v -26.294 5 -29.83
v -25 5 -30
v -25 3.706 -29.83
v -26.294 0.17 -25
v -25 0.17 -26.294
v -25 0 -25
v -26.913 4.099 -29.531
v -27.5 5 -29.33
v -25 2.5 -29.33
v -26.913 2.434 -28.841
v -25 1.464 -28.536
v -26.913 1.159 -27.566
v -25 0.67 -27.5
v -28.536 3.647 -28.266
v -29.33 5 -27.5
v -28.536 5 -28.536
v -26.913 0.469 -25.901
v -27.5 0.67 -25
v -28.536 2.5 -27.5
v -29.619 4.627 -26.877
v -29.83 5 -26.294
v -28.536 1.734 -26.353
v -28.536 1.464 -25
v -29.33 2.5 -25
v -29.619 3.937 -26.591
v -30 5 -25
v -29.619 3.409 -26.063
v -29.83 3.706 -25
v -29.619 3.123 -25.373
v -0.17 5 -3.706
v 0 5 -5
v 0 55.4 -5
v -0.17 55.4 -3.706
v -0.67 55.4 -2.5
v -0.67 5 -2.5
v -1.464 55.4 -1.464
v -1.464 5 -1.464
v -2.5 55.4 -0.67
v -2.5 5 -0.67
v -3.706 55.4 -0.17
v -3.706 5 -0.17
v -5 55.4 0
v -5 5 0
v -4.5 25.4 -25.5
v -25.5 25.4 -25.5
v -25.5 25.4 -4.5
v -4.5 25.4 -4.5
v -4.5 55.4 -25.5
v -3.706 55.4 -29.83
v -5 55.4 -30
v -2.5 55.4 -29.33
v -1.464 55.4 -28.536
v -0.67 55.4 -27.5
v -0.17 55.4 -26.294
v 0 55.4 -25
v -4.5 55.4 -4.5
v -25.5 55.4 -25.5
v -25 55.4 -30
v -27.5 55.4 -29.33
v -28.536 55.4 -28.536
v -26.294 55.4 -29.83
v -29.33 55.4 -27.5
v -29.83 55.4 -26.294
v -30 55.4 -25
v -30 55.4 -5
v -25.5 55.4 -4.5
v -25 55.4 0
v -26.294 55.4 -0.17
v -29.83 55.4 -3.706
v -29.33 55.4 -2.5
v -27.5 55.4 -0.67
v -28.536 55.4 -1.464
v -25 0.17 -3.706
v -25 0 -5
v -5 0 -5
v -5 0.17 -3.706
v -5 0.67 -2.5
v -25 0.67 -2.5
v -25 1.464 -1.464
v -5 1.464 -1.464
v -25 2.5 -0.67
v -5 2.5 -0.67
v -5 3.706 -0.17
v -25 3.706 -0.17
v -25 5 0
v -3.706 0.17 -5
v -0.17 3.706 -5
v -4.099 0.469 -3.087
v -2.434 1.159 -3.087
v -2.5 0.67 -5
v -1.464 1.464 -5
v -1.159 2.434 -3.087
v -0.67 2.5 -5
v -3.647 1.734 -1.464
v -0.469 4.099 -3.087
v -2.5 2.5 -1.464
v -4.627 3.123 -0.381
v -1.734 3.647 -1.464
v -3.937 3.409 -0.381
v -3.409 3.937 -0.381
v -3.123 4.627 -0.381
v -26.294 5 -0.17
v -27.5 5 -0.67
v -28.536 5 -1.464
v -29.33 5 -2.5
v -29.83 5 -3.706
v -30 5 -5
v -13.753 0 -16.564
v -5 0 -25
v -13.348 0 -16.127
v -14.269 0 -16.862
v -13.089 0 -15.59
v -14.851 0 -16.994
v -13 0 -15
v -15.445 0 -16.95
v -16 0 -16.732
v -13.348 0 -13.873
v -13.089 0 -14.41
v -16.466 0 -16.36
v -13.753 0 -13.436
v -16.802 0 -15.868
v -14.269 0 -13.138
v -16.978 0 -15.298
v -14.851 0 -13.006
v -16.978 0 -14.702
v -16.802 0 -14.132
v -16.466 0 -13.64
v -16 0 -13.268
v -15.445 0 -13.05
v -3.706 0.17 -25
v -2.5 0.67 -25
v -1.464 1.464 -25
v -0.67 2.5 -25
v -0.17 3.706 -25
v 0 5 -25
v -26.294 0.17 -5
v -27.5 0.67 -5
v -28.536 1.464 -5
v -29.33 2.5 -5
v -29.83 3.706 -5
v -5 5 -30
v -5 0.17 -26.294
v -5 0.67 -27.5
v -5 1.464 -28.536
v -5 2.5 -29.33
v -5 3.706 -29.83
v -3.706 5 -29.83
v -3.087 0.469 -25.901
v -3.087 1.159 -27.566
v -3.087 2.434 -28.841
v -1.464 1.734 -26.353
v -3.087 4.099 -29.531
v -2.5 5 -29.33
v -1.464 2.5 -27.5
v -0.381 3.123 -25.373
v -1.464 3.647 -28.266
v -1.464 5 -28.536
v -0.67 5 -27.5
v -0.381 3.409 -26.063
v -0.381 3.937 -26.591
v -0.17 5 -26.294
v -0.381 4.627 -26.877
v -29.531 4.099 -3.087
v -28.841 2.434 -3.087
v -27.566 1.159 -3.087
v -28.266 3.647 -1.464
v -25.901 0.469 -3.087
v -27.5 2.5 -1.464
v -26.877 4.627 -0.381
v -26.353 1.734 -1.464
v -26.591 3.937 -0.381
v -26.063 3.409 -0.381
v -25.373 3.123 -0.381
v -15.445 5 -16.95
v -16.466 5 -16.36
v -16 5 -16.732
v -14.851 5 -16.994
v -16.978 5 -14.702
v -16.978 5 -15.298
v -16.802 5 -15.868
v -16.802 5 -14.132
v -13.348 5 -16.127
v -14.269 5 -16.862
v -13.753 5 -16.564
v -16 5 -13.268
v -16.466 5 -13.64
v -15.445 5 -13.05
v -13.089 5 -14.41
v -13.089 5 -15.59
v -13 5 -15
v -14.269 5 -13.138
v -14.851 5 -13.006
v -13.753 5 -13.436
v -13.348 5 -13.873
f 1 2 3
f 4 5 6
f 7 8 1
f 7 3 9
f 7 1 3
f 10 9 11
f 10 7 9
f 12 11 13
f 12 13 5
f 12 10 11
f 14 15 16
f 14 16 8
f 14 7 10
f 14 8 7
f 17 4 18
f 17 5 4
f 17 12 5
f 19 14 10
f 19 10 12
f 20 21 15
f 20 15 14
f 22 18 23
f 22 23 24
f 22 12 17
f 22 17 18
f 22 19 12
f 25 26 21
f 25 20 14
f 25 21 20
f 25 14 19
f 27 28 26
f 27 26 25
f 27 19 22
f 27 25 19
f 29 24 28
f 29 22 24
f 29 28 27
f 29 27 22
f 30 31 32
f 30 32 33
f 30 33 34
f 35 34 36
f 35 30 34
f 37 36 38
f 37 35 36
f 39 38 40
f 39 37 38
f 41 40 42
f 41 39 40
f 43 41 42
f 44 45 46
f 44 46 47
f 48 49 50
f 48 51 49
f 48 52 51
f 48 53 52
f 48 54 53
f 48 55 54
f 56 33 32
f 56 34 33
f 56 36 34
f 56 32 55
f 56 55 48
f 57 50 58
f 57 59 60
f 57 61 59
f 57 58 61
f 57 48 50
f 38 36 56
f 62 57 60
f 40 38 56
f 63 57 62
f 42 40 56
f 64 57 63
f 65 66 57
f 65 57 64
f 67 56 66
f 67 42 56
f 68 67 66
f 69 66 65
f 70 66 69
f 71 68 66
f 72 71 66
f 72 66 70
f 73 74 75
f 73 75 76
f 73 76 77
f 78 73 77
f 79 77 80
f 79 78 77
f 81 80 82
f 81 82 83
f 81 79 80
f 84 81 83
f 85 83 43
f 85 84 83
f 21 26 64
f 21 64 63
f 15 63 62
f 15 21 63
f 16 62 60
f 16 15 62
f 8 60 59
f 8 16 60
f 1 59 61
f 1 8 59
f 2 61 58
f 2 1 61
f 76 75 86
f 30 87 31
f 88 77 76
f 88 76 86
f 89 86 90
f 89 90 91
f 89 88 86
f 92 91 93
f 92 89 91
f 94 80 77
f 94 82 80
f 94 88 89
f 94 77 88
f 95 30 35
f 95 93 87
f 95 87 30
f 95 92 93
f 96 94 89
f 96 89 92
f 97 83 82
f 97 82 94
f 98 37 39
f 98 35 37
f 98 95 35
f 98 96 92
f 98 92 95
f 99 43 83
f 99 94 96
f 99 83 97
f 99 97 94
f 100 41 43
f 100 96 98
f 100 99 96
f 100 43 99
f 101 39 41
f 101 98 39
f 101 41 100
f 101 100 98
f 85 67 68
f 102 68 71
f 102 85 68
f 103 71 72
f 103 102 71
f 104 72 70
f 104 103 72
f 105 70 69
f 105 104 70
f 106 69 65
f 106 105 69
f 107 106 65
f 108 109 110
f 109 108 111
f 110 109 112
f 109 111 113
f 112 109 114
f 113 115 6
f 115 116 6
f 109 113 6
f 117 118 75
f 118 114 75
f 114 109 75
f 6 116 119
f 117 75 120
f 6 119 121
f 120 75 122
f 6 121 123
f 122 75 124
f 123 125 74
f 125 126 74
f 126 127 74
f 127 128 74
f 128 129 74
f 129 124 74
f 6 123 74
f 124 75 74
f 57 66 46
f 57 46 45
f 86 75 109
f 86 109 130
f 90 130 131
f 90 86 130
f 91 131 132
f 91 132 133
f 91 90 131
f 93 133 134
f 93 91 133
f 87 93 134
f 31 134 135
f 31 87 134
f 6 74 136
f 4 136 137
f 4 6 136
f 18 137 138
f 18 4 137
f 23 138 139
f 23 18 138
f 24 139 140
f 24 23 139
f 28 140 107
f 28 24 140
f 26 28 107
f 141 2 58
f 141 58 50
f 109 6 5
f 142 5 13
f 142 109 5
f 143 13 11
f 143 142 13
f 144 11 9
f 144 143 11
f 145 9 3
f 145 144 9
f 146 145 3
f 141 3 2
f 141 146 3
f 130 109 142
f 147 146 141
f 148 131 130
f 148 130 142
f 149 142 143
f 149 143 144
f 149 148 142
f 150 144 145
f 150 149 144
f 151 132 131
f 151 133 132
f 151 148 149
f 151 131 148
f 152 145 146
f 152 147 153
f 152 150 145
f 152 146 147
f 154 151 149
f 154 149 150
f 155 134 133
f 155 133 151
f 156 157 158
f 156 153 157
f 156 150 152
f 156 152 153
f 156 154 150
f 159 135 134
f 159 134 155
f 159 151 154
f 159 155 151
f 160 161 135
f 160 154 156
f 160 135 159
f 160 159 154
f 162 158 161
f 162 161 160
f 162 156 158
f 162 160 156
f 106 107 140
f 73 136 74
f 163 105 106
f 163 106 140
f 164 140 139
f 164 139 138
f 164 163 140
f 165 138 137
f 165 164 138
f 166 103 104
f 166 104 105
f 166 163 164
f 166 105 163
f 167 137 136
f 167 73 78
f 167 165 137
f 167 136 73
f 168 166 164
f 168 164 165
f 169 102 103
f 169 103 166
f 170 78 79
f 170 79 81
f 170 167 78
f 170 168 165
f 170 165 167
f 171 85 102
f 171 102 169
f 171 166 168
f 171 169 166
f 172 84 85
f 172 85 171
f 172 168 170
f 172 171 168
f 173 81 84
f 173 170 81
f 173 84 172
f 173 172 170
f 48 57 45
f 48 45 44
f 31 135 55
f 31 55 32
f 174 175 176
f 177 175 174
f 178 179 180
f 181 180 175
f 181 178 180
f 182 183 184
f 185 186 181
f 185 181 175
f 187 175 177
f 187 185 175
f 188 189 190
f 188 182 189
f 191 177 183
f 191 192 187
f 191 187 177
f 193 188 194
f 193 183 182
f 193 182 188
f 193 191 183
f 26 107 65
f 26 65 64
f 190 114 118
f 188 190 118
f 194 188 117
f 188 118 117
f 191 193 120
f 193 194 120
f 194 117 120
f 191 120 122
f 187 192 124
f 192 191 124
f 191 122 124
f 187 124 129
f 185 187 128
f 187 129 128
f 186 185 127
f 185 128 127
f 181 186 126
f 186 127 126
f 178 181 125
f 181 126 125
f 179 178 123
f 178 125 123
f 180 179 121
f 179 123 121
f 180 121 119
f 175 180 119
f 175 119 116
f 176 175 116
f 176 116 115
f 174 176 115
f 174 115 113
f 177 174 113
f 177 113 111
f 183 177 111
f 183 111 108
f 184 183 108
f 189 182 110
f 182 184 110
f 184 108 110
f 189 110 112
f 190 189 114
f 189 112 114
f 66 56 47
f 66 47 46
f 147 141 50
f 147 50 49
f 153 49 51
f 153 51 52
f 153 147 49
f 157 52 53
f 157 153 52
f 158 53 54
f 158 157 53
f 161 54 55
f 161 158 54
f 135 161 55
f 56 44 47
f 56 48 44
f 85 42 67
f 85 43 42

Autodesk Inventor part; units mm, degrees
ref_plane "YZ Plane" through (0, 0, 0) normal (1, 0, 0) x (0, 1, 0)
ref_plane "XZ Plane" through (0, 0, 0) normal (0, 1, 0) x (-1, 0, 0)
ref_plane "XY Plane" through (0, 0, 0) normal (0, 0, 1) x (1, 0, 0)
sketch "Sketch1" plane through (0, 0, 0) normal (0, 1, 0) x (-1, 0, 0)
  line L0 (0, 0) -> (30, 0)
  line L1 (30, 0) -> (30, -30)
  line L2 (30, -30) -> (0, -30)
  line L3 (0, -30) -> (0, 0)
  dimension "d0" = 30
  dimension "d1" = 30
extrude "Extrusion1" add sketch "Sketch1" along normal blind 55.4
sketch "Sketch2" plane through (0, 55.4, 0) normal (0, 1, 0) x (1, 0, 0)
  line L0 (0, 0) -> (0, 30) projected
  line L1 (0, 0) -> (0, 4.5)
  line L2 (0, 4.5) -> (-4.5, 4.5)
  line L3 (-4.5, 4.5) -> (-25.5, 4.5)
  line L4 (-25.5, 4.5) -> (-25.5, 25.5)
  line L5 (-25.5, 25.5) -> (-4.5, 25.5)
  line L6 (-4.5, 25.5) -> (-4.5, 4.5)
  dimension "d4" = 4.5
  dimension "d5" = 4.5
  dimension "d6" = 21
  dimension "d7" = 21
extrude "Extrusion2" cut sketch "Sketch2" against normal blind 30
sketch "Sketch3" plane through (0, 0, 0) normal (0, -1, 0) x (1, 0, 0)
  line L0 (0, 0) -> (-15, 0)
  line L1 (0, 0) -> (-30, 0) projected
  line L2 (-15, 0) -> (-15, -15)
  circle A0 centre (-15, -15) radius 2
  dimension "d10" = 15
  dimension "d11" = 4
extrude "Extrusion3" cut sketch "Sketch3" against normal blind 5
fillet "Fillet1" radius 5 4 edges at (0, 0, -15) (-15, 0, 0) (-15, 0, -30) (-30, 0, -15)
fillet "Fillet2" radius 5 8 edges at (-1.4645, 1.4645, -28.5355) (0, 30.2, -30) (-1.4645, 1.4645, -1.4645) (0, 30.2, 0) (-28.5355, 1.4645, -28.5355) (-30, 30.2, -30) (-28.5355, 1.4645, -1.4645) (-30, 30.2, 0)
properties part number "1in_2020_Endcap"
